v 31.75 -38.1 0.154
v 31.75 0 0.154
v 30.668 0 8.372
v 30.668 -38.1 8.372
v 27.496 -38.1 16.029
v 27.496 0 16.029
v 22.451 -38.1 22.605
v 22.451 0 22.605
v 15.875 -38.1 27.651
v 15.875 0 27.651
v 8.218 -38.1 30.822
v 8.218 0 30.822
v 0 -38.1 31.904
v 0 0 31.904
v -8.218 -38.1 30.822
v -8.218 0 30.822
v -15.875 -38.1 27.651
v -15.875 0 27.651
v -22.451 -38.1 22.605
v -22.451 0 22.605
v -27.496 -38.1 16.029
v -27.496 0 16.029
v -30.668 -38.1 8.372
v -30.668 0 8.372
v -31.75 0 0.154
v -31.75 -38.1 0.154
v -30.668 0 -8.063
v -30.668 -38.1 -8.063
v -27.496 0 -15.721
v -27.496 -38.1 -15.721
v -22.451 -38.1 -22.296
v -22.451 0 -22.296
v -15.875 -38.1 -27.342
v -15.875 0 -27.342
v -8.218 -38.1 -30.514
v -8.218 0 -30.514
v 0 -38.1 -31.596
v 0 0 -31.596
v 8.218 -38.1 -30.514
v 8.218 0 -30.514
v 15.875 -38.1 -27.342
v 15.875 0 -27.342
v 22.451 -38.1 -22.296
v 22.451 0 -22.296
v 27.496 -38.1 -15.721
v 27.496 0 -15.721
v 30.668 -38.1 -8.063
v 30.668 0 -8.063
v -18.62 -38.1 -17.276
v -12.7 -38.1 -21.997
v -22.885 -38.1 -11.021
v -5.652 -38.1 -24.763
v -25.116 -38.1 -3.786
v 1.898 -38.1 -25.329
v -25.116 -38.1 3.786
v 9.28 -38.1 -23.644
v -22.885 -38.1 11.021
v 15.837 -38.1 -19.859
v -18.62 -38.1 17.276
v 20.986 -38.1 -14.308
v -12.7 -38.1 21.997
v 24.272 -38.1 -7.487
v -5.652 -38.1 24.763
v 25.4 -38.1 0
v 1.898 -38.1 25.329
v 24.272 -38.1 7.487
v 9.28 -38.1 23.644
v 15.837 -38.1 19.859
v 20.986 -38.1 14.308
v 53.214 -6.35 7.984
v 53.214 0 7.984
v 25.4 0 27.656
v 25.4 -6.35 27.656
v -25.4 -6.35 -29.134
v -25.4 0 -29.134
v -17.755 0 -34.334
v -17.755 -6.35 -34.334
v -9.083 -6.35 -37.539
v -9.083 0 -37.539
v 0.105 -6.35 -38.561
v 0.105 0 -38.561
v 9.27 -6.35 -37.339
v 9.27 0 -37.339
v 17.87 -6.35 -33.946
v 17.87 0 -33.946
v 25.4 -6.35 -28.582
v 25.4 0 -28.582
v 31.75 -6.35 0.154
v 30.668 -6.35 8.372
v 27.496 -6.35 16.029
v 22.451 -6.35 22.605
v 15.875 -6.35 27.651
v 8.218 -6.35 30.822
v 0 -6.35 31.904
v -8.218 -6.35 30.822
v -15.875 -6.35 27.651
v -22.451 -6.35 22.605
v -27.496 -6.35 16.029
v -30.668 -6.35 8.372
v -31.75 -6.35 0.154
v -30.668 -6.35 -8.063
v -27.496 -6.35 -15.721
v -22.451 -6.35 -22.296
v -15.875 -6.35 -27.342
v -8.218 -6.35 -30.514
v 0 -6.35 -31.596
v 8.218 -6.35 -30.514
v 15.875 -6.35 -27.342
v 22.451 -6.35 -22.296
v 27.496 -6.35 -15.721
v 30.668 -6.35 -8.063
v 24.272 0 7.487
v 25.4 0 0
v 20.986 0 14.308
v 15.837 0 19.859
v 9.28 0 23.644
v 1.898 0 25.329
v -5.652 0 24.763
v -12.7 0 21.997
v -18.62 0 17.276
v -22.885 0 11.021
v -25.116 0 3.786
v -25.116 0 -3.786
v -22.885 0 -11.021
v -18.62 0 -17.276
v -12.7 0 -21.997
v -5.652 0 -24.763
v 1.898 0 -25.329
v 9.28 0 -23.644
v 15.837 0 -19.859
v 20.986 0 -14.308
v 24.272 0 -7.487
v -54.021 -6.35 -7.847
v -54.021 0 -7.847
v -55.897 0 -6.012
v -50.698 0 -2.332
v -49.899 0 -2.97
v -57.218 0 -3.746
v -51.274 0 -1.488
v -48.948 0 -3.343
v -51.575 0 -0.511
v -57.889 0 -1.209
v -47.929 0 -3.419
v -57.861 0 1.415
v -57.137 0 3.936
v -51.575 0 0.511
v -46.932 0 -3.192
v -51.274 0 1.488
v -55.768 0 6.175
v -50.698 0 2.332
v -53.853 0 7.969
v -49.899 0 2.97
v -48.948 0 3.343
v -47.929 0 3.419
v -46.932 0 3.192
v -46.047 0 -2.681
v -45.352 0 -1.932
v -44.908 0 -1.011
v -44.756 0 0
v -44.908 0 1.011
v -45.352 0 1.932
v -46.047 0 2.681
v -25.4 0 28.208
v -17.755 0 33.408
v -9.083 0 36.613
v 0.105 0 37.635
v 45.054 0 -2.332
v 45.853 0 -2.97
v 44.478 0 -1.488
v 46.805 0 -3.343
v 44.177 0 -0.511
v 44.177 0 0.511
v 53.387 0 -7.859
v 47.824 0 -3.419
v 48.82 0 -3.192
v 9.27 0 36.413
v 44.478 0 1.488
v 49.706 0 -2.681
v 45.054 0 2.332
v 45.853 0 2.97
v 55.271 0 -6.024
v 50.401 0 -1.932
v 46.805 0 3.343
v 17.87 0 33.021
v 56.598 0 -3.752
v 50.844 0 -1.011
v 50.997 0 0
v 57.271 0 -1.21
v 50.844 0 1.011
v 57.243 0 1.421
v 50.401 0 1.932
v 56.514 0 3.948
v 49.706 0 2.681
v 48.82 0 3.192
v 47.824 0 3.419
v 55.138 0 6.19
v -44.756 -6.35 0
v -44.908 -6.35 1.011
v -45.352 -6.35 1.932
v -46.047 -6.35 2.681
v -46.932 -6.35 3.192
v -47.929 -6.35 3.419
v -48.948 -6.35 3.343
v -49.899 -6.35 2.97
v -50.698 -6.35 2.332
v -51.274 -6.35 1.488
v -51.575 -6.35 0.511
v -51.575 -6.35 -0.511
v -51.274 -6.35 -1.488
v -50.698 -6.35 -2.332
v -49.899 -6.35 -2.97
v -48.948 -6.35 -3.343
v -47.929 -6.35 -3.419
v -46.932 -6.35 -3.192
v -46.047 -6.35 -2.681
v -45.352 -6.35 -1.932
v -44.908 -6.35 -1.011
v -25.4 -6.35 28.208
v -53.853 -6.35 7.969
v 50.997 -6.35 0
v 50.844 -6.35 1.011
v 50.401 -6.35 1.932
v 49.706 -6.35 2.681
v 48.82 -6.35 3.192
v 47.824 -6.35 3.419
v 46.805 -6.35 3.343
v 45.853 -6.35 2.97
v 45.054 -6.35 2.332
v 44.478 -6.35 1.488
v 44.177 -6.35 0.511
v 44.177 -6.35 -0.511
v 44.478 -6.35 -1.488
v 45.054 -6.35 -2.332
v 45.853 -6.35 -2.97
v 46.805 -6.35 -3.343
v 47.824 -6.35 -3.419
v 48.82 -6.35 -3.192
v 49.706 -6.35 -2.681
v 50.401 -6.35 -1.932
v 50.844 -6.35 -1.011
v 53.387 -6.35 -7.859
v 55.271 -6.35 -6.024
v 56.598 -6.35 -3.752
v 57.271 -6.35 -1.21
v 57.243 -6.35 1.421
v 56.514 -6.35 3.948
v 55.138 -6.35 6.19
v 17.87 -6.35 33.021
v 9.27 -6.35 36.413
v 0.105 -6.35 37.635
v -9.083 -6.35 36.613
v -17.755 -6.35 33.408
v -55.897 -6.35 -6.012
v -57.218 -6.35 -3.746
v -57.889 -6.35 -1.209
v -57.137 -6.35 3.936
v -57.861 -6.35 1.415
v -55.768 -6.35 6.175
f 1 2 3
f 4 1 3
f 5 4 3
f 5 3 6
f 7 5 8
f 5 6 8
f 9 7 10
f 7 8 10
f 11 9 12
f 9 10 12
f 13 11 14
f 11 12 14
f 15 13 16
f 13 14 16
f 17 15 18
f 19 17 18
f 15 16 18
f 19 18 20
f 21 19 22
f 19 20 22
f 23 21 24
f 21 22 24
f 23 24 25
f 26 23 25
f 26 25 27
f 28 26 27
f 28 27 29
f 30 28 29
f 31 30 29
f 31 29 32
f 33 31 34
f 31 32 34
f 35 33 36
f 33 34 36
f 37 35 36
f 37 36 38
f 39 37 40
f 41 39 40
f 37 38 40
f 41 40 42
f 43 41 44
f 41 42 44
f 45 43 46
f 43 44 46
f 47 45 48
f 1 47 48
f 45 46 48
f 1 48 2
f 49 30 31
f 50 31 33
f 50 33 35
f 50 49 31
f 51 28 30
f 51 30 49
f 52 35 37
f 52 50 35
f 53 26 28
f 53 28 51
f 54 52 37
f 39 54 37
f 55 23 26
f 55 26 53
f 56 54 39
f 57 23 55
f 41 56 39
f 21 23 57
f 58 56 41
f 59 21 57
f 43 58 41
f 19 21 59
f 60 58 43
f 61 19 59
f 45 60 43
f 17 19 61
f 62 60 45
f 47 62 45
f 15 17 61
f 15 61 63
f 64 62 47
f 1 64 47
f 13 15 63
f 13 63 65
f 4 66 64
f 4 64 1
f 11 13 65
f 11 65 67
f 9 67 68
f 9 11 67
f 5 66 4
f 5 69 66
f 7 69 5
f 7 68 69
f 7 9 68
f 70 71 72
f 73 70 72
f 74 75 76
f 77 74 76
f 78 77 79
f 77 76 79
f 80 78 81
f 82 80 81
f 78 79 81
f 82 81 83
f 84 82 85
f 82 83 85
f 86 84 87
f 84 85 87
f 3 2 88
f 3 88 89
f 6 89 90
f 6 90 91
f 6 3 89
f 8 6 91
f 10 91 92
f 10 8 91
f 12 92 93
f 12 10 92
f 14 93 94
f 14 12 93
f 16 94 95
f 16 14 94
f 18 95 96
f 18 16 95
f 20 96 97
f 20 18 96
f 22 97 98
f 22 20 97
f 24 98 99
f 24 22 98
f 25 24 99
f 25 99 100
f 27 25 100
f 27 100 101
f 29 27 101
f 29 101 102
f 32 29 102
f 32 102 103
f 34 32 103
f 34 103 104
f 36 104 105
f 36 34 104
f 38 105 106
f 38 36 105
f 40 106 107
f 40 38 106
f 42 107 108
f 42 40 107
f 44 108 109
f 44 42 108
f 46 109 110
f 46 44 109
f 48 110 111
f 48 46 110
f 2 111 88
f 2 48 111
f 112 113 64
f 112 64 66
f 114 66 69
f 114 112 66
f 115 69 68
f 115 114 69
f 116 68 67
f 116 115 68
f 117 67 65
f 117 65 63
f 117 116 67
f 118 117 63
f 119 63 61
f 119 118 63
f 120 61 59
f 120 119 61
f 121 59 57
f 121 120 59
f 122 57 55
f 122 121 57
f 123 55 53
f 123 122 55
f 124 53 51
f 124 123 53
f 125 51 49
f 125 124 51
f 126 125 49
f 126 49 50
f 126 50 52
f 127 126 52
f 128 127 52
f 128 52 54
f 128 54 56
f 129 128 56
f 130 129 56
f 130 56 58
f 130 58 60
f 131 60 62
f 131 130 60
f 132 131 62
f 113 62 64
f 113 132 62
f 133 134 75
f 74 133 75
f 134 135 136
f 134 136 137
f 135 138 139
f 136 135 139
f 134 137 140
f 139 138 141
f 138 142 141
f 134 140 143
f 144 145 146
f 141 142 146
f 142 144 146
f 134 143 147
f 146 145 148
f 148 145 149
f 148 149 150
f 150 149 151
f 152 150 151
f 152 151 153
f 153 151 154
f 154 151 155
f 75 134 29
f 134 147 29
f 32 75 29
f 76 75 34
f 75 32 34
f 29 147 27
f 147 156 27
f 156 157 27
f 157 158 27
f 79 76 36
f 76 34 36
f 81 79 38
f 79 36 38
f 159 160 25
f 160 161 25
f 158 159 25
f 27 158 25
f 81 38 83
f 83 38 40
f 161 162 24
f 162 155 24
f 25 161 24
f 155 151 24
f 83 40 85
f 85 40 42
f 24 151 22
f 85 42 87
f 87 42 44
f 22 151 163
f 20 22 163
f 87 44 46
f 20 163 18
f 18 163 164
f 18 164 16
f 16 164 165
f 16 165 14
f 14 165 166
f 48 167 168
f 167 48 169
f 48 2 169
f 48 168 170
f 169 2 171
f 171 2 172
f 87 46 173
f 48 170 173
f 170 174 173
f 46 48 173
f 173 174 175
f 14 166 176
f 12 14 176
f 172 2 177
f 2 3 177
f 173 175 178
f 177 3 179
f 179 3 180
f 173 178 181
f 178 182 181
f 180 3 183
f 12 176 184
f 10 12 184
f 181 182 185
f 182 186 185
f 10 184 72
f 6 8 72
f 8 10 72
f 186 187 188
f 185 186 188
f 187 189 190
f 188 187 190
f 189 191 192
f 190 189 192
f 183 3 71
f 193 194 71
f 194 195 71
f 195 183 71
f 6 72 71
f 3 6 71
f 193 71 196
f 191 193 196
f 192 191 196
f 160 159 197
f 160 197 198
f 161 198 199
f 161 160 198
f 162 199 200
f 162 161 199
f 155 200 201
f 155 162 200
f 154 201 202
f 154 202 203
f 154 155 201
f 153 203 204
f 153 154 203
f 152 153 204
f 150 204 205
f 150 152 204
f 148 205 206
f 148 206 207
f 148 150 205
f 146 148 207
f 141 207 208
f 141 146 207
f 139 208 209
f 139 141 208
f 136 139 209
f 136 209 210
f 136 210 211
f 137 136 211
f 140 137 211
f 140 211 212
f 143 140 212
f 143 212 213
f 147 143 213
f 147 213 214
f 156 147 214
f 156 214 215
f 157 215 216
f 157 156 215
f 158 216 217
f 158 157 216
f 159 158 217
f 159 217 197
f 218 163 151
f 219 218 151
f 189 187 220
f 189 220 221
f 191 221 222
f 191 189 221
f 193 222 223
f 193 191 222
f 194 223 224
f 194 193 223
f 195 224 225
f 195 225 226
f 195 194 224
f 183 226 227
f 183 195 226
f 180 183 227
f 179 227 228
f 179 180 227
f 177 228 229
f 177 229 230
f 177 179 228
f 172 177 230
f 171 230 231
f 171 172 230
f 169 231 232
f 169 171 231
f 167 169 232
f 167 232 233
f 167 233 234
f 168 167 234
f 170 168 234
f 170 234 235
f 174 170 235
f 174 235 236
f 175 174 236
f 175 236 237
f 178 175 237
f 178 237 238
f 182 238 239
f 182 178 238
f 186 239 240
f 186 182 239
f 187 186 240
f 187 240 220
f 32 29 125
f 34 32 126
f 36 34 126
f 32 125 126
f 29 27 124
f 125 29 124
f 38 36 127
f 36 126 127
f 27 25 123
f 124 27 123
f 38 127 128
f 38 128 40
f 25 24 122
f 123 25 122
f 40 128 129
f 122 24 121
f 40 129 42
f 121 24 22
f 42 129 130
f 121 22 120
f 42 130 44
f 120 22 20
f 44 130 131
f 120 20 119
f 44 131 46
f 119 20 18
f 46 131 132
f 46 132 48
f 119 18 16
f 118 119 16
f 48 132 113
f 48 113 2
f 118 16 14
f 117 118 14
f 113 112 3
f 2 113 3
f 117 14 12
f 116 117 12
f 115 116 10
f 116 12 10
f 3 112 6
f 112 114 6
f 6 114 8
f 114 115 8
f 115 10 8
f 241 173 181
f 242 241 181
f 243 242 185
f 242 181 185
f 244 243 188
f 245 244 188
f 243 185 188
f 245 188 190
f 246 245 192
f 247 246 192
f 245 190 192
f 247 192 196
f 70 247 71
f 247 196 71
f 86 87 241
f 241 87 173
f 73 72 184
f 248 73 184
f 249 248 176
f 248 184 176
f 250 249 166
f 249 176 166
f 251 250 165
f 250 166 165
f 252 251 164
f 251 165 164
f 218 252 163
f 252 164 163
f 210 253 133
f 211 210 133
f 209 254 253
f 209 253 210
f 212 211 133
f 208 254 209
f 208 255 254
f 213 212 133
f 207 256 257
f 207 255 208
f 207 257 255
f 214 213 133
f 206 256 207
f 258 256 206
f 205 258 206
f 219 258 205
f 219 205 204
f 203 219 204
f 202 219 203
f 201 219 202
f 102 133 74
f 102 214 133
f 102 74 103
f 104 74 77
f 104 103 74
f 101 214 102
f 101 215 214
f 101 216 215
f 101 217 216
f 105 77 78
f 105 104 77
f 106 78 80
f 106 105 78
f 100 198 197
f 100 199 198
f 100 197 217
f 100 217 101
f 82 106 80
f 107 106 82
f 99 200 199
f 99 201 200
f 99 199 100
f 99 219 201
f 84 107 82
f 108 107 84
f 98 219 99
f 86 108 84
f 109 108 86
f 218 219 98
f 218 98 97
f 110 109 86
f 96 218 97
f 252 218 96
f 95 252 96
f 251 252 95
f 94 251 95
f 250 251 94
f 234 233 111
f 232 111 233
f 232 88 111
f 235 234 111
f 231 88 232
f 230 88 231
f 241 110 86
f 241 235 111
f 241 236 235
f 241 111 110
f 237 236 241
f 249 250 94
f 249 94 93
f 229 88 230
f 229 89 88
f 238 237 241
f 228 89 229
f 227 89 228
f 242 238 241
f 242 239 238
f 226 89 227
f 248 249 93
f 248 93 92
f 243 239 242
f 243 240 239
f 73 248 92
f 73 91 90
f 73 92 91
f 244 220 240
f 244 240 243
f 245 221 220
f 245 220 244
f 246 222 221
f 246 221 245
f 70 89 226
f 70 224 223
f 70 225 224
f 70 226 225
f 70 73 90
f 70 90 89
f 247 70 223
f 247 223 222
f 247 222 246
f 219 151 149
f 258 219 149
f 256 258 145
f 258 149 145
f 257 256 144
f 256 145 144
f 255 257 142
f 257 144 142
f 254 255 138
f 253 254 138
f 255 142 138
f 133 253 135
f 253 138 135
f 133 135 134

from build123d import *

# Parameters (mm, degrees)
F0_R     = 3.429
F0_R_2   = 31.75
F1_DEPTH = 6.35
F0_R_3   = 25.4
F2_DEPTH = 38.1


with BuildPart() as f1:
    # F0 (on Front) → F1 (new body)
    with BuildSketch(Plane.XZ):
        with BuildLine():
            Line((53.214374, 7.983912), (25.4, 27.656138))
            ThreePointArc((25.4, 27.656138), (0.105444, 37.634877), (-25.4, 28.208205))
            Line((-25.4, 28.208205), (-53.8531, 7.968619))
            ThreePointArc((-53.8531, 7.968619), (-57.963221, 0.103714), (-54.020843, -7.846598))
            Line((-54.020843, -7.846598), (-25.4, -29.133952))
            ThreePointArc((-25.4, -29.133952), (0.105444, -38.560624), (25.4, -28.581885))
            Line((25.4, -28.581885), (53.386849, -7.859087))
            ThreePointArc((53.386849, -7.859087), (57.346026, 0.106453), (53.214374, 7.983912))
        make_face()
        with Locations((-48.184771, 0)):
            Circle(F0_R, mode=Mode.SUBTRACT)
        with Locations((0, 0.154291)):
            Circle(F0_R_2, mode=Mode.SUBTRACT)
        with Locations((47.567606, 0)):
            Circle(F0_R, mode=Mode.SUBTRACT)
    extrude(amount=F1_DEPTH)


with BuildPart() as f2:
    # F0 (on Front) → F2 (new body)
    with BuildSketch(Plane.XZ):
        with Locations((0, 0.154291)):
            Circle(F0_R_2)
        Circle(F0_R_3, mode=Mode.SUBTRACT)
    extrude(amount=F2_DEPTH)


solid = Compound([f1.part, f2.part])
